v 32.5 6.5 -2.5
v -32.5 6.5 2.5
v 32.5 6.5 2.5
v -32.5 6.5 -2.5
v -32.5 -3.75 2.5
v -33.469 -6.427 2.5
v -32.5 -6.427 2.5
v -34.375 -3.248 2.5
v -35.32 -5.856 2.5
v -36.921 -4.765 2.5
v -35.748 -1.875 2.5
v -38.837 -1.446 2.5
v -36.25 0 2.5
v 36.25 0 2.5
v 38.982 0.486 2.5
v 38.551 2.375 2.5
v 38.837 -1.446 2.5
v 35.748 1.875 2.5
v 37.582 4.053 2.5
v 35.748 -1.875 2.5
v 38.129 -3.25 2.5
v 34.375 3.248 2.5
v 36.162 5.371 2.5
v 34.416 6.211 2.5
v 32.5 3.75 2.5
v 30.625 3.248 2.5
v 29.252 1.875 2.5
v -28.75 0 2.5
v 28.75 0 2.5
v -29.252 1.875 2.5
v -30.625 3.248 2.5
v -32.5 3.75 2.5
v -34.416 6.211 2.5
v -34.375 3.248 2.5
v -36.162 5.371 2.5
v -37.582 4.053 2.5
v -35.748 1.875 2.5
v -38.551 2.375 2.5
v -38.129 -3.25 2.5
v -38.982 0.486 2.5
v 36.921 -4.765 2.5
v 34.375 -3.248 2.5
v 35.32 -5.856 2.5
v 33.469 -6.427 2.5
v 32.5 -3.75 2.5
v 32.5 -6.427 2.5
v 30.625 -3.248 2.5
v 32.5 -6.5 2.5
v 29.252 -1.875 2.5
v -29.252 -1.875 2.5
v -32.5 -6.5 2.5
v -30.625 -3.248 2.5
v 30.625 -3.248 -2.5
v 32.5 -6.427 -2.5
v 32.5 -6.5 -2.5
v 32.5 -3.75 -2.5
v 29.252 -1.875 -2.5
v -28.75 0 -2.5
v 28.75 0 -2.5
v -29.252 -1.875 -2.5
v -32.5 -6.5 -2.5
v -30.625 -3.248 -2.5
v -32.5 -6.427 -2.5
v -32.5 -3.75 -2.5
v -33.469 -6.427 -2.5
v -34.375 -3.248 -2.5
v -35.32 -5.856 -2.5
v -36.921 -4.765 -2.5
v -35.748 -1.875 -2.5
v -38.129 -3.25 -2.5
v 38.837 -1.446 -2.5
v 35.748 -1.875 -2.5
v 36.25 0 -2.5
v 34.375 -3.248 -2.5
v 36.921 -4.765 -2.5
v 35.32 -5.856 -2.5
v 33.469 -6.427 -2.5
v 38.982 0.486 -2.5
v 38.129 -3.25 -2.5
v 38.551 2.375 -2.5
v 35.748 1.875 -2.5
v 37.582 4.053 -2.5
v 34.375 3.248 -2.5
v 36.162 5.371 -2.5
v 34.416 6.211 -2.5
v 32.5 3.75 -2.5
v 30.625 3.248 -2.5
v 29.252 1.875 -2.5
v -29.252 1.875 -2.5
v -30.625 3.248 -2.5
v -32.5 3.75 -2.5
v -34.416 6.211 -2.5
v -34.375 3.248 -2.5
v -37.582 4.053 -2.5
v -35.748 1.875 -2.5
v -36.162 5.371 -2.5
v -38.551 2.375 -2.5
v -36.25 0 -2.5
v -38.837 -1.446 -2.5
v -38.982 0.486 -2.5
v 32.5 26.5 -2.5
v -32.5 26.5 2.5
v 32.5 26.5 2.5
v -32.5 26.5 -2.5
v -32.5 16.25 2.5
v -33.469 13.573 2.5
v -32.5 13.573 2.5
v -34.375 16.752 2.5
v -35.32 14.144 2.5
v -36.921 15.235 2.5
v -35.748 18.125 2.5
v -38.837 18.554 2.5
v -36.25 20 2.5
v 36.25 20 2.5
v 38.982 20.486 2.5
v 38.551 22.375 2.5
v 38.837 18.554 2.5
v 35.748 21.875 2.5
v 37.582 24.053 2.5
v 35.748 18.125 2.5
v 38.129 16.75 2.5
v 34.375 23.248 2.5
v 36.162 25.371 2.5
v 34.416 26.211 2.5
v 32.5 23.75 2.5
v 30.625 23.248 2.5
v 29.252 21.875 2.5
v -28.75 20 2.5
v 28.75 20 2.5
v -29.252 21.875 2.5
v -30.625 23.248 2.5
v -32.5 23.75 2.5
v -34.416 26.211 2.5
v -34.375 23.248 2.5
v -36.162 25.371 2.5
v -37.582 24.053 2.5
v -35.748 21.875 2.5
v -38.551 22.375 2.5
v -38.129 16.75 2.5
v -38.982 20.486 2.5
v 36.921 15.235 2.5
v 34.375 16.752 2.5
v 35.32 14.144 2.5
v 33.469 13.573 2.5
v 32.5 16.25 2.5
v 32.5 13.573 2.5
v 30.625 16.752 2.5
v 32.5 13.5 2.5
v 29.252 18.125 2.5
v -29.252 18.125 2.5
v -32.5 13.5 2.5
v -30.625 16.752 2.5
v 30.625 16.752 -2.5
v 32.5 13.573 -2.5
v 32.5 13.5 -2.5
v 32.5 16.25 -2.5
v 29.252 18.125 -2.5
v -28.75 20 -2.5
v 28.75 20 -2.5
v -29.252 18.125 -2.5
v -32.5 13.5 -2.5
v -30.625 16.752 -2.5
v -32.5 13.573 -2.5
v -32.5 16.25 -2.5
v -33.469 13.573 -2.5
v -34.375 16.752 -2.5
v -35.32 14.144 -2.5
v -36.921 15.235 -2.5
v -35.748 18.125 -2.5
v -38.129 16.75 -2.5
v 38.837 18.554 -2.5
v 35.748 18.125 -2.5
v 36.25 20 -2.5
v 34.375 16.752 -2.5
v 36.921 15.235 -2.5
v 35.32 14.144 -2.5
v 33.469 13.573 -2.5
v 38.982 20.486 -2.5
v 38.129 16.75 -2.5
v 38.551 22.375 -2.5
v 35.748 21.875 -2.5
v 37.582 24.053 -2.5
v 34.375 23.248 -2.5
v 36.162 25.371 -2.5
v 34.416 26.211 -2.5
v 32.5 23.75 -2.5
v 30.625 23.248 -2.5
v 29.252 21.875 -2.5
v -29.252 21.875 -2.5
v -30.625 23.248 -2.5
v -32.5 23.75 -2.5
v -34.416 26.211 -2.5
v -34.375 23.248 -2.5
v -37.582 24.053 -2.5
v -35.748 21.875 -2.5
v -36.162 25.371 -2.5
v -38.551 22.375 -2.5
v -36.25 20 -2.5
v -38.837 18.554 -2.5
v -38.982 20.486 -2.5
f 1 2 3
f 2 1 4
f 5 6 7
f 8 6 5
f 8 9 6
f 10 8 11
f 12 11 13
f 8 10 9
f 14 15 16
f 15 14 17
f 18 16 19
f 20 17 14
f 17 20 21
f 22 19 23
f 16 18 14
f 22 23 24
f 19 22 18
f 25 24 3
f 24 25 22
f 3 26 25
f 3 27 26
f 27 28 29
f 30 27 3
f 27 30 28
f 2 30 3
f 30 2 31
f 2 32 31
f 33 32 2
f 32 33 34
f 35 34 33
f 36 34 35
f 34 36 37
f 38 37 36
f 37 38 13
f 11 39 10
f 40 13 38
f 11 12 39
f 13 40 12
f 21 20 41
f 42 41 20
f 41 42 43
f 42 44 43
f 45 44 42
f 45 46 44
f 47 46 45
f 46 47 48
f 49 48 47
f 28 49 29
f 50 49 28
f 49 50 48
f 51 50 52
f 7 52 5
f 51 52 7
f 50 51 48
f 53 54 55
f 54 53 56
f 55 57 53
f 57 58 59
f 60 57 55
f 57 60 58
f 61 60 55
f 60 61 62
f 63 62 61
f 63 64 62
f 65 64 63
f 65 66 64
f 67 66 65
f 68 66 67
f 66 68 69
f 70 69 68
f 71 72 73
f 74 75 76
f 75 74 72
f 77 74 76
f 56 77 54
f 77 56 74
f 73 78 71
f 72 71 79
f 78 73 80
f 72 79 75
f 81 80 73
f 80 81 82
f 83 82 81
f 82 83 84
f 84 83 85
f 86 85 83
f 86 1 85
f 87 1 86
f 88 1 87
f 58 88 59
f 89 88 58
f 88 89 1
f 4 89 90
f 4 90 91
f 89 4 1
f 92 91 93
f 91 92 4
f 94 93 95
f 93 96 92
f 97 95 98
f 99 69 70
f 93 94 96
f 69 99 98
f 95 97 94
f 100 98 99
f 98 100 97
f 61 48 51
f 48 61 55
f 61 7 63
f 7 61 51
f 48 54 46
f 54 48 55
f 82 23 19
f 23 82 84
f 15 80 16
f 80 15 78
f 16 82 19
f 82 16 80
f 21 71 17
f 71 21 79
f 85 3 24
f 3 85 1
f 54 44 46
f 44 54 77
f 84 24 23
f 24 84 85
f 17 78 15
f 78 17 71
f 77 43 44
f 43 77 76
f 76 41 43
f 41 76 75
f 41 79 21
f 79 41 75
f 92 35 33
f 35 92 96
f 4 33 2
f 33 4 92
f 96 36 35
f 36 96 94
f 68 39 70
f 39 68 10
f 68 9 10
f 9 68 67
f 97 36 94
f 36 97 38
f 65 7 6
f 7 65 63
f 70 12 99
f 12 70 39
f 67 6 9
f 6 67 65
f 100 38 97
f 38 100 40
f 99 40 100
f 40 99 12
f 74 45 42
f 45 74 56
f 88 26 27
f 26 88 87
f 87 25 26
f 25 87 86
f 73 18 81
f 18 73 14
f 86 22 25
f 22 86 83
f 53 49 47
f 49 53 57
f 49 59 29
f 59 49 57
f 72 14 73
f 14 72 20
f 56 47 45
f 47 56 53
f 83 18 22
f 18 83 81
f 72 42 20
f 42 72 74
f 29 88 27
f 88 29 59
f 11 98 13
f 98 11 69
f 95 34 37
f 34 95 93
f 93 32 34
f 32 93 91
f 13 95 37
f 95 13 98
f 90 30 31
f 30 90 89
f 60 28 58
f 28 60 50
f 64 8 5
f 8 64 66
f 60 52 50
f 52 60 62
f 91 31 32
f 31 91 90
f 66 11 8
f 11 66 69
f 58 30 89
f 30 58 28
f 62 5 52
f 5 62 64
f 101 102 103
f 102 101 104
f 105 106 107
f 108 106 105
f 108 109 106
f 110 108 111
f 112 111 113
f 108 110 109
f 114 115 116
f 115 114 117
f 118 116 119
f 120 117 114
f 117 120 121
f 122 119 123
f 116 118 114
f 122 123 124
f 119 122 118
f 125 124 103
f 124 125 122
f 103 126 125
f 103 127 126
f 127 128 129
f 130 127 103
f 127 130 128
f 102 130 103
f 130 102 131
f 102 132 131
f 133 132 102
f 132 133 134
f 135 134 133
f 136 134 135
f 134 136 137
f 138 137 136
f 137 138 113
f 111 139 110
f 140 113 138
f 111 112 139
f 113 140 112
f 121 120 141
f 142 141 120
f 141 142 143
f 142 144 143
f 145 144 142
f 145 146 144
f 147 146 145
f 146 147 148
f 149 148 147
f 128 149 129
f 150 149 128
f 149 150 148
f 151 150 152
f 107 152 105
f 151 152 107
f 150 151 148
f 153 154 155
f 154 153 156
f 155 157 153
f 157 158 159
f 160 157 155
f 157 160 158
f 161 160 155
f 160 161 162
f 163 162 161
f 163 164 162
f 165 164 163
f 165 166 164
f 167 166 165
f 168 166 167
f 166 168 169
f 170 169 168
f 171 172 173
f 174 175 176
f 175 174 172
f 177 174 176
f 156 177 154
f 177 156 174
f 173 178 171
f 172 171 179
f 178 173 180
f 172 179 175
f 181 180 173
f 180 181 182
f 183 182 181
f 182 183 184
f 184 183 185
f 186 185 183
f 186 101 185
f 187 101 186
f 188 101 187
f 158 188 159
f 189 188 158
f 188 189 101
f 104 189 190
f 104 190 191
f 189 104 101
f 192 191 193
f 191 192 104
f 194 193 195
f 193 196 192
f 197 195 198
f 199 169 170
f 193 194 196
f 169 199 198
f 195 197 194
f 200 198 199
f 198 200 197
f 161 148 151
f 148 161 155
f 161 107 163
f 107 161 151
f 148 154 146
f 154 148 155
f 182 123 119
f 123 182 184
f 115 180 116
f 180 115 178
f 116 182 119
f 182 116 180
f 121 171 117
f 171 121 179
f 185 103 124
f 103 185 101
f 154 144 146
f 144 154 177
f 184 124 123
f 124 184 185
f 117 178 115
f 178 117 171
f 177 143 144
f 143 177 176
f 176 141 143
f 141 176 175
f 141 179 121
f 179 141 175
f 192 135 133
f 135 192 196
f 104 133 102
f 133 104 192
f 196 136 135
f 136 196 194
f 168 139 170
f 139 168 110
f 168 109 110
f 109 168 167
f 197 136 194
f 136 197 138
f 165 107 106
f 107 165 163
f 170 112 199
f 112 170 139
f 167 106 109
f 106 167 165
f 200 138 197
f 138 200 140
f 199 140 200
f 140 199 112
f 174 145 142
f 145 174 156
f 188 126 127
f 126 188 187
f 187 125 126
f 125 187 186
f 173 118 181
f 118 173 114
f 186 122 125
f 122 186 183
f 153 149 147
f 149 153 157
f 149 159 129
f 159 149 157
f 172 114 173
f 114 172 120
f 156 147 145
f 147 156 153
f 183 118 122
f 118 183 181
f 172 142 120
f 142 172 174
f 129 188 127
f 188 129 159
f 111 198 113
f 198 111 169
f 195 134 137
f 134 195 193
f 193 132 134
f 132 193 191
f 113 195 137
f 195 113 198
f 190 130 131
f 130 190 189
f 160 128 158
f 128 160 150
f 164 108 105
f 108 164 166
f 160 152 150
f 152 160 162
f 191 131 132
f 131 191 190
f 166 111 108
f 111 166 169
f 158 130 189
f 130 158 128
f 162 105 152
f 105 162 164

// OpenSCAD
module pitman(){
    pt = [13,65,5]; // Dimensiones de los brazos
    rh = 3.75; // Radio ejes
    
    difference(){
        union(){
            cube(pt, center = true);
            translate([0,-pt.y/2,0])
                cylinder(r = pt.x/2, h = pt.z, center = true);
            translate([0,pt.y/2,0])
                cylinder(r = pt.x/2, h = pt.z, center = true);
        }
        translate([0,-pt.y/2,0])
            cylinder(r = rh, h = pt.z, center = true);
        translate([0,pt.y/2,0])
            cylinder(r = rh, h = pt.z, center = true);
    }
}

rotate([0,0,90])
    pitman();
translate([0,20,0])
rotate([0,0,90])
    pitman();
